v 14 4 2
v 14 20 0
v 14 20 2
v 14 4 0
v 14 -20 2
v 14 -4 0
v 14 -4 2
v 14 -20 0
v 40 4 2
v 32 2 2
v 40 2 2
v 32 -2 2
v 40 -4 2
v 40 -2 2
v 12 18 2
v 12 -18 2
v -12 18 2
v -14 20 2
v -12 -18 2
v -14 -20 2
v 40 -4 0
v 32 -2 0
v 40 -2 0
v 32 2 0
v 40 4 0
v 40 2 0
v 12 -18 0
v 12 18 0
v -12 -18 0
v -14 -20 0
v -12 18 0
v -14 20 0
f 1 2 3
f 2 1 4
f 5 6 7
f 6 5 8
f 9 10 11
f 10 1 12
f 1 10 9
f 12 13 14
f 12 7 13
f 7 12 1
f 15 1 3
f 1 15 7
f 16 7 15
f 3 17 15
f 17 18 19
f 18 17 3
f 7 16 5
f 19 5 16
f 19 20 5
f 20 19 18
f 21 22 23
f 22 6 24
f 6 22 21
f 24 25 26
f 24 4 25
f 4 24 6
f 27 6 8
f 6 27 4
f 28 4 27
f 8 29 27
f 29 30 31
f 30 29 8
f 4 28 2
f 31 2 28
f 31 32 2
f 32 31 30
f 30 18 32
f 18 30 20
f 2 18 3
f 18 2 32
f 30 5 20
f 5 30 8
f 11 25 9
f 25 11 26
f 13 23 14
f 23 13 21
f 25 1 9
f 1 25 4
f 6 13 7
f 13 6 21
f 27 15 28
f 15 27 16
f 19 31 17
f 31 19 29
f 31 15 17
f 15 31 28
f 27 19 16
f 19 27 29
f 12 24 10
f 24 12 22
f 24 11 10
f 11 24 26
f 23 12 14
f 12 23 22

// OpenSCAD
//Visual aid to explain how focal distance influences field of view
//Used in analog photography workshop
format=[24,36];
//format=[56,56];
//format=[56,84];
height=40;
wall=2;
air=1;
thickness=8;
length=137;

module frame() {
  difference() {
    union() {
      translate([-format[0]/2-wall,-format[1]/2-wall,0]) cube ([format[0]+2*wall,format[1]+2*wall,wall]);
      translate([0,-thickness/2,0])cube([height,thickness,wall]);
    }
    translate([-format[0]/2,-format[1]/2,-1/100]) cube([format[0],format[1],wall+2/100]);
    translate([height-thickness,-thickness/4,-1/100]) cube([thickness+1/100,thickness/2,wall+2/100]);
  } 
}

module eyepiece() {
  difference() {
    union() {
      cylinder (d=2*thickness,h=wall);
      translate([0,-thickness/2,0])cube([height,thickness,wall]);
    }
    translate([0,0,-1/100])cylinder (d=thickness,h=wall+2/100);
    translate([height-thickness,-thickness/4,-1/100]) cube([thickness+1/100,thickness/2,wall+2/100]);
  } 
}

module stange() {
  difference() {
    cube([thickness,length,thickness]);
    for (tr=[wall:5:length]) {
      translate([3*thickness/4-air/2,tr,-1/100]) cube([thickness,wall+air,thickness+2/100]);
      translate([-3*thickness/4+air/2,tr,-1/100]) cube([thickness,wall+air,thickness+2/100]);
    }
  }
}

frame();
//eyepiece();
//stange();
